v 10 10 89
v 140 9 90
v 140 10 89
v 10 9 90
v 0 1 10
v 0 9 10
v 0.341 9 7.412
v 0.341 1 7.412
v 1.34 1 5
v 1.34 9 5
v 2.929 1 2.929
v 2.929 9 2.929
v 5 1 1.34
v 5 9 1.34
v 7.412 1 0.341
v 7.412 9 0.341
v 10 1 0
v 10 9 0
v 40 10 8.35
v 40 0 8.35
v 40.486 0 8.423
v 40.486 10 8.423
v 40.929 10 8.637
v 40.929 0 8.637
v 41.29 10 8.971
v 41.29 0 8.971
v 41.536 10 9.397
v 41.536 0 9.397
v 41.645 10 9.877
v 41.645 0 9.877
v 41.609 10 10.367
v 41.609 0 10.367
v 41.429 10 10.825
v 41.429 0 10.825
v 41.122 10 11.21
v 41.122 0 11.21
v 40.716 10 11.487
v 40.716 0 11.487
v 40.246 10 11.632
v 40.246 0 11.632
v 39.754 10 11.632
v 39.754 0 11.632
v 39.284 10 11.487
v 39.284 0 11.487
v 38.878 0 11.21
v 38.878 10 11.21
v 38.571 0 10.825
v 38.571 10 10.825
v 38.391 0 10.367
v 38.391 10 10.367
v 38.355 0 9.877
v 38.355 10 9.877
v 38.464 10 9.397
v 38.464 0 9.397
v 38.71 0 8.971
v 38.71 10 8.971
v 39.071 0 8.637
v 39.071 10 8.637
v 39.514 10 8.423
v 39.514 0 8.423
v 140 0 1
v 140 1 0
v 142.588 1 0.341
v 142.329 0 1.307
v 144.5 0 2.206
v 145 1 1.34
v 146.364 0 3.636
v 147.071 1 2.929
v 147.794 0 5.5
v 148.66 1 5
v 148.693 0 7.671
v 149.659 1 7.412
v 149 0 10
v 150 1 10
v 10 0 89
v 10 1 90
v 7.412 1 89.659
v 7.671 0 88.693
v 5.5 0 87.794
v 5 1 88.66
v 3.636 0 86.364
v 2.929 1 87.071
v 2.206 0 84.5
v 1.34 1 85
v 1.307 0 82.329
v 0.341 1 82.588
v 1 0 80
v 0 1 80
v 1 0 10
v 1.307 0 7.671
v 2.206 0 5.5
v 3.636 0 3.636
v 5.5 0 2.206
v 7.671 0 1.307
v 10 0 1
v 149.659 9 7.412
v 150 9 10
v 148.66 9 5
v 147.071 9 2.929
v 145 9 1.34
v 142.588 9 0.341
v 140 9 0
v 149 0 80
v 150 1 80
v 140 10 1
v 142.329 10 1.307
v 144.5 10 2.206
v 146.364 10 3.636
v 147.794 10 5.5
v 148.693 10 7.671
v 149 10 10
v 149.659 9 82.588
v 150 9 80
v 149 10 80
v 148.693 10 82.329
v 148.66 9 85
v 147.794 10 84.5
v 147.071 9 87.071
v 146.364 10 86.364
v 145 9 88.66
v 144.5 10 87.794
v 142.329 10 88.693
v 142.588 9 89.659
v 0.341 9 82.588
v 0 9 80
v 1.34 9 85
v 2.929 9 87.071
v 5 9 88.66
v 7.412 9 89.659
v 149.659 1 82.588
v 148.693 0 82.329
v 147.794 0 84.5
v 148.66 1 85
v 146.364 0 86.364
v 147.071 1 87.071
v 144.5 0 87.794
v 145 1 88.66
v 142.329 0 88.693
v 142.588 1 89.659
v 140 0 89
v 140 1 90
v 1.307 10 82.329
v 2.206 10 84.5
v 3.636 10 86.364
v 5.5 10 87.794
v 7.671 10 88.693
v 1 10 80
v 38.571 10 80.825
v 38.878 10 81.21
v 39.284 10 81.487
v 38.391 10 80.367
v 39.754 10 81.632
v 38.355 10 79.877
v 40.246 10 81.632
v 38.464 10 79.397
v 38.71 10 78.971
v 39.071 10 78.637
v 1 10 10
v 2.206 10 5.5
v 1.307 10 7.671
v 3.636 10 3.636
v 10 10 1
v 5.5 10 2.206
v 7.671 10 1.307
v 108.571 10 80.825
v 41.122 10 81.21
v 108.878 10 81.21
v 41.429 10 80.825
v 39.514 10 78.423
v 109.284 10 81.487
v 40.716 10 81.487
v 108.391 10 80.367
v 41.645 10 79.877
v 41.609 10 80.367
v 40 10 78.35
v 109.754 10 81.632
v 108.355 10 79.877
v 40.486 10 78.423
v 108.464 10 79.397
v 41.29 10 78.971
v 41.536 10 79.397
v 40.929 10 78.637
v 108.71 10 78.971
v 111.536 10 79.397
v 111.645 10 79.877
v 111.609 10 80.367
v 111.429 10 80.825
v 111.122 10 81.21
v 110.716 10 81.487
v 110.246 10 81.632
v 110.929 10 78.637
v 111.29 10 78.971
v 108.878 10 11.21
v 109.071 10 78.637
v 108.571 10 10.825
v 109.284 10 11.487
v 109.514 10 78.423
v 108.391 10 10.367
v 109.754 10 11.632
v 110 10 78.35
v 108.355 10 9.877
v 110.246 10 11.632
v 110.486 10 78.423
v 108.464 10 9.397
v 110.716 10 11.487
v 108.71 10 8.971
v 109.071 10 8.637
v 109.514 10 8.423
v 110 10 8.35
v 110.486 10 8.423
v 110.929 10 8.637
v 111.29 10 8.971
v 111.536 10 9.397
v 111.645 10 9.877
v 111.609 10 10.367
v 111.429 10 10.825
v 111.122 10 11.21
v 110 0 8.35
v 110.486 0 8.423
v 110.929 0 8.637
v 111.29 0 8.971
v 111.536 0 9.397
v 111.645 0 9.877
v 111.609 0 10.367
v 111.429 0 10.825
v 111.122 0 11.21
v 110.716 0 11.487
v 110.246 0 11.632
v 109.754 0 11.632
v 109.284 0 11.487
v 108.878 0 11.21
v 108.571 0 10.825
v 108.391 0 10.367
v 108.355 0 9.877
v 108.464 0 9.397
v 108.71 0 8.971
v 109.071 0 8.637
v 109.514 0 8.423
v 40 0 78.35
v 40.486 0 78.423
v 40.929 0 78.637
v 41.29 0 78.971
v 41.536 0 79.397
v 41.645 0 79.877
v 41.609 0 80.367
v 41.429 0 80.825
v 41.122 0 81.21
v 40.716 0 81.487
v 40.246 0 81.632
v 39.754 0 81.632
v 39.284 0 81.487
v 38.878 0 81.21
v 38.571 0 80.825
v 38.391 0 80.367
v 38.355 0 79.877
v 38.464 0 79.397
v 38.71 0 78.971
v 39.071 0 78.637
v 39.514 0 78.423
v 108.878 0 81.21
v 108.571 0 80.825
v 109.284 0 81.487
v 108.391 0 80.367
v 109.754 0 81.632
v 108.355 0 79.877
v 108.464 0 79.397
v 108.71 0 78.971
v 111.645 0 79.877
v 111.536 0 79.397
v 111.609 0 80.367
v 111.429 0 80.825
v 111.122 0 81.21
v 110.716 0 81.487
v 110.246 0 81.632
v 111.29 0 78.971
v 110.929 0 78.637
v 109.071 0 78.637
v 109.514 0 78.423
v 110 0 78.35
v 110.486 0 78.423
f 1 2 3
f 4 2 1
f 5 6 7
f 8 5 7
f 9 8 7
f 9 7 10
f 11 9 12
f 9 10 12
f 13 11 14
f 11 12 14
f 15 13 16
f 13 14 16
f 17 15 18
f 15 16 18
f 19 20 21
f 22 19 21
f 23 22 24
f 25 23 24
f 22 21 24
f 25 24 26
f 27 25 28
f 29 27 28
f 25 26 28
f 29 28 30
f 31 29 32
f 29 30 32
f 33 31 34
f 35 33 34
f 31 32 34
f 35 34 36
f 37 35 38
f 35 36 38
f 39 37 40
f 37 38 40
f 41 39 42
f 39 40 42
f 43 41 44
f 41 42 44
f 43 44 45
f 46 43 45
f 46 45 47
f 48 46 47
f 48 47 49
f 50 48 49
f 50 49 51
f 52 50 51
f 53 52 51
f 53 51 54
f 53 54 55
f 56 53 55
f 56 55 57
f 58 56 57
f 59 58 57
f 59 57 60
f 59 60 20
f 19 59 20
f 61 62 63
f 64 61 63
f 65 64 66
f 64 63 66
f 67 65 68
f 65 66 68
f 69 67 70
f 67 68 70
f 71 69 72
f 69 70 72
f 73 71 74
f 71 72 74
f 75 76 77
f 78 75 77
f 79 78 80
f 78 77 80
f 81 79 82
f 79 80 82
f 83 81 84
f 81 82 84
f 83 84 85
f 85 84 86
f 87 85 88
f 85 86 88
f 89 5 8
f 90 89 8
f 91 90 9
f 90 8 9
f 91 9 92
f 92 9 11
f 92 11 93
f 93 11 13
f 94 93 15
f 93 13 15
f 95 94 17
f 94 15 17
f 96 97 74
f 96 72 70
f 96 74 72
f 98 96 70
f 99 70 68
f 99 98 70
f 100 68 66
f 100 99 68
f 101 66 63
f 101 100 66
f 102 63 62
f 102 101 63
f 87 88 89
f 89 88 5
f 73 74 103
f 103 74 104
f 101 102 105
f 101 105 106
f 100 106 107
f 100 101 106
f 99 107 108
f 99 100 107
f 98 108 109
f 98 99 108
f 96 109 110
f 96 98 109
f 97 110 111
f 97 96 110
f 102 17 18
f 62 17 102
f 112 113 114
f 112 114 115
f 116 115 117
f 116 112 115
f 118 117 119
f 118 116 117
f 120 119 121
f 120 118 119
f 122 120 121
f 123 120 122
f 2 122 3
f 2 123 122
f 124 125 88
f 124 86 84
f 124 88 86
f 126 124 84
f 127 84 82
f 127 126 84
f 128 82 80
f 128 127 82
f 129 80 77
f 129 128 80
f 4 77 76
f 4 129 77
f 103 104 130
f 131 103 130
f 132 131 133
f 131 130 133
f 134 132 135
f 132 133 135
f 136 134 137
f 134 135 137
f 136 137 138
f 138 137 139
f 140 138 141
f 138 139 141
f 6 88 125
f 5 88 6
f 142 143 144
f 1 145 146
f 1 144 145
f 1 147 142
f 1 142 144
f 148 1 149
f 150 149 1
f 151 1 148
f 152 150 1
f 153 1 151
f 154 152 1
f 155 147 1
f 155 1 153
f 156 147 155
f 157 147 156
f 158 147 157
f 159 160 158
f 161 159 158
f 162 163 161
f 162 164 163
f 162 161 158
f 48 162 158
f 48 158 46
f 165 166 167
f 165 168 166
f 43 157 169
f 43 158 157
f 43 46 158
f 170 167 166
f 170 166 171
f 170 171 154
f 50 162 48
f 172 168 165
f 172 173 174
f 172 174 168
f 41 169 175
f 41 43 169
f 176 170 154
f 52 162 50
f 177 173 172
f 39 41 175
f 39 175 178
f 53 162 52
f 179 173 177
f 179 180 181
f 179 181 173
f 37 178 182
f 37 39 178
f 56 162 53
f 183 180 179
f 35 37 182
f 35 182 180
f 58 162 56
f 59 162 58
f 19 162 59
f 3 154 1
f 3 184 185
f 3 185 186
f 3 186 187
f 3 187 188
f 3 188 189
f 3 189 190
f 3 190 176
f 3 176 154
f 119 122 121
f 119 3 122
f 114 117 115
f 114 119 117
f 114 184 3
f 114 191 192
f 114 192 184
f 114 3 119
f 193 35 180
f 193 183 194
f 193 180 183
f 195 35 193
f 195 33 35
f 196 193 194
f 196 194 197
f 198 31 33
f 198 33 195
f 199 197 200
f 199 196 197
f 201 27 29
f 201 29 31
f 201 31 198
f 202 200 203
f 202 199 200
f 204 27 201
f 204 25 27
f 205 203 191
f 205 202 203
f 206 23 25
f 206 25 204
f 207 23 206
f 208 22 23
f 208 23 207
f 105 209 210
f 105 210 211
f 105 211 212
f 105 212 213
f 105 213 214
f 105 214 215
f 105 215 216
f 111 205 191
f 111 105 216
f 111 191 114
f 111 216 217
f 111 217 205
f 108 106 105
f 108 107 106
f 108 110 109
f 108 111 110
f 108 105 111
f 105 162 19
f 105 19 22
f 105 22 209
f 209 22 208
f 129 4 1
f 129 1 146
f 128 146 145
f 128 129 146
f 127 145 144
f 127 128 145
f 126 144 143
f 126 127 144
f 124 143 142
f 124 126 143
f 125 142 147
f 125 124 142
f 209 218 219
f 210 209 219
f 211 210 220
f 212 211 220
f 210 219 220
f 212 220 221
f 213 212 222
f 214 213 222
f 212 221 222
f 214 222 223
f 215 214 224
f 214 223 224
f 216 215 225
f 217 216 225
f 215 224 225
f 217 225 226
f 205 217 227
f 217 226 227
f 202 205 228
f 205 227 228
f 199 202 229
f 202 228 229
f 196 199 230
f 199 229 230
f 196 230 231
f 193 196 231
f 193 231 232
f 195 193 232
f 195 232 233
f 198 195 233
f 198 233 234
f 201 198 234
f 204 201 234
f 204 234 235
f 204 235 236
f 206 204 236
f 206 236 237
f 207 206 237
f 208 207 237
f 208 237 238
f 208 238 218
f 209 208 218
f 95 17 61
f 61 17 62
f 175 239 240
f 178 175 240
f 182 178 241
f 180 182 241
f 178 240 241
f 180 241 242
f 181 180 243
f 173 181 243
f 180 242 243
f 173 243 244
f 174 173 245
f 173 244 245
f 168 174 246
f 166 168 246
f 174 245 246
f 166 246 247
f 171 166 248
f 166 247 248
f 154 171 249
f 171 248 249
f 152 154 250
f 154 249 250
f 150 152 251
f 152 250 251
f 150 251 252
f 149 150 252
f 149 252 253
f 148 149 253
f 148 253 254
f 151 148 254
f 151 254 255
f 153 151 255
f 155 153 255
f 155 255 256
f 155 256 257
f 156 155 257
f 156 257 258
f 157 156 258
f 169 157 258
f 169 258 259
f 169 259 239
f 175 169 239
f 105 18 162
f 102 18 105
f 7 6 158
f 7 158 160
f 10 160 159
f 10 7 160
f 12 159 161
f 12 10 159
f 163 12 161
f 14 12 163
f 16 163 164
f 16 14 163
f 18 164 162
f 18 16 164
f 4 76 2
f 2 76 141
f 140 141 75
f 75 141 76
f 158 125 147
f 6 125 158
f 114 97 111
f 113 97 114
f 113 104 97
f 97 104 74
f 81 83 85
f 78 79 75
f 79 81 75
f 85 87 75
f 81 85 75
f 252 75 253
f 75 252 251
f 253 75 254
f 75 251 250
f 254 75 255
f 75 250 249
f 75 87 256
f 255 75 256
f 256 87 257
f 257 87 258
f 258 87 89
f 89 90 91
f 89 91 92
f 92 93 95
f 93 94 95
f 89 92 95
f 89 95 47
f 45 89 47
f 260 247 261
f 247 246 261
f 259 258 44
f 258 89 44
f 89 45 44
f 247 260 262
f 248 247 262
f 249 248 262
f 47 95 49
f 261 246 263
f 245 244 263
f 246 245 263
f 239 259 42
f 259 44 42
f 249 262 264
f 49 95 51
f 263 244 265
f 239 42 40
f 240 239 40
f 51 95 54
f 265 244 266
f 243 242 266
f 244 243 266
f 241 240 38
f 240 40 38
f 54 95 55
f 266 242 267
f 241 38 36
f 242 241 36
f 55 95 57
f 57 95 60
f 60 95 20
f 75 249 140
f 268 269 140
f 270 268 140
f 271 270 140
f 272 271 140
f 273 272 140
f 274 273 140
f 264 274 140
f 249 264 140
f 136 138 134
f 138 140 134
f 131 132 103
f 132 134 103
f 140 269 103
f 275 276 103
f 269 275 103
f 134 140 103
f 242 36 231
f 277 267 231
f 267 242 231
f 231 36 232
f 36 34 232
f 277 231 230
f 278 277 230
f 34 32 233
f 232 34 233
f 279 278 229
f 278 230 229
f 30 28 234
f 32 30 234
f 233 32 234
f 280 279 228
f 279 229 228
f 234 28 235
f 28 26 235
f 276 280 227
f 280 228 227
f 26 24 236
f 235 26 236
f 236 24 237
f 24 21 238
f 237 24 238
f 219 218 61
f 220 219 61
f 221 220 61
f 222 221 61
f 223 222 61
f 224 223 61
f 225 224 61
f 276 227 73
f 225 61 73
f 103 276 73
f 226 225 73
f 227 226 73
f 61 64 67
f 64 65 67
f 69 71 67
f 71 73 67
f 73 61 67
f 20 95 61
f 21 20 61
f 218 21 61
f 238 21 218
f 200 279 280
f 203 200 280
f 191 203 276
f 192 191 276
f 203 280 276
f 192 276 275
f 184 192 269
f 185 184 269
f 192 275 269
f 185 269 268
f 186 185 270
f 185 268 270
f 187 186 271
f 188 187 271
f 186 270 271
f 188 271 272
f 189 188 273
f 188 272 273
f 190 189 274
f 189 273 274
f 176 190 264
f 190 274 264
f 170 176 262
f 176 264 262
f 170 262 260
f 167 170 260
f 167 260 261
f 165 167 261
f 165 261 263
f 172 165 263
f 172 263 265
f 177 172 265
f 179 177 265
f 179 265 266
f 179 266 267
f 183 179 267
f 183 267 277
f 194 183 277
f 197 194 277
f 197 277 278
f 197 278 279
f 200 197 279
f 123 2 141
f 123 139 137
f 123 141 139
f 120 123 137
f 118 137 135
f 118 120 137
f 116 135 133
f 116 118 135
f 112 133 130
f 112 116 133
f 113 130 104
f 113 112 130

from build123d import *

# Parameters (mm, degrees)
SKETCH_1_W         = 150
SKETCH_1_H         = 90
EXTRUDE_1_DEPTH    = 10
FILLET_2_R         = 10
CHAMFER_1_SIZE     = 1
CHAMFER_2_SIZE     = 1
HOLE_WIZARD_M4_3_D = 3.3


with BuildPart() as part:
    # 草图1 → 凸台-拉伸1 (new body)
    with BuildSketch(Plane(origin=(0, 0, 0), x_dir=(1, 0, 0), z_dir=(0, 1, 0))):
        with Locations((75, -45)):
            Rectangle(SKETCH_1_W, SKETCH_1_H)
    extrude(amount=EXTRUDE_1_DEPTH)

    # 圆角2
    fillet_2_edges = [part.edges().sort_by_distance(p)[0] for p in [
        (0, 5, 0),
        (150, 5, 0),
        (150, 5, 90),
        (0, 5, 90),
    ]]
    fillet(fillet_2_edges, radius=FILLET_2_R)

    # 倒角1
    chamfer_1_edges = [part.edges().sort_by_distance(p)[0] for p in [
        (75, 0, 0),
        (0, 0, 45),
        (150, 0, 45),
        (75, 0, 90),
        (2.928932188, 0, 2.928932188),
        (2.928932188, 0, 87.071067812),
        (147.071067812, 0, 87.071067812),
        (147.071067812, 0, 2.928932188),
    ]]
    chamfer(chamfer_1_edges, length=CHAMFER_1_SIZE)

    # 倒角2
    chamfer_2_edges = [part.edges().sort_by_distance(p)[0] for p in [
        (75, 10, 0),
        (150, 10, 45),
        (0, 10, 45),
        (75, 10, 90),
        (2.928932188, 10, 2.928932188),
        (2.928932188, 10, 87.071067812),
        (147.071067812, 10, 87.071067812),
        (147.071067812, 10, 2.928932188),
    ]]
    chamfer(chamfer_2_edges, length=CHAMFER_2_SIZE)

    # M4 螺纹孔3 (through all)
    with Locations(Plane(origin=(40, 10, 10), x_dir=(0, 0, 1), z_dir=(0, 1, 0))):
        with Locations((0, 0), (0, 70), (70, 0), (70, 70)):
            Hole(HOLE_WIZARD_M4_3_D / 2)


solid = part.part
